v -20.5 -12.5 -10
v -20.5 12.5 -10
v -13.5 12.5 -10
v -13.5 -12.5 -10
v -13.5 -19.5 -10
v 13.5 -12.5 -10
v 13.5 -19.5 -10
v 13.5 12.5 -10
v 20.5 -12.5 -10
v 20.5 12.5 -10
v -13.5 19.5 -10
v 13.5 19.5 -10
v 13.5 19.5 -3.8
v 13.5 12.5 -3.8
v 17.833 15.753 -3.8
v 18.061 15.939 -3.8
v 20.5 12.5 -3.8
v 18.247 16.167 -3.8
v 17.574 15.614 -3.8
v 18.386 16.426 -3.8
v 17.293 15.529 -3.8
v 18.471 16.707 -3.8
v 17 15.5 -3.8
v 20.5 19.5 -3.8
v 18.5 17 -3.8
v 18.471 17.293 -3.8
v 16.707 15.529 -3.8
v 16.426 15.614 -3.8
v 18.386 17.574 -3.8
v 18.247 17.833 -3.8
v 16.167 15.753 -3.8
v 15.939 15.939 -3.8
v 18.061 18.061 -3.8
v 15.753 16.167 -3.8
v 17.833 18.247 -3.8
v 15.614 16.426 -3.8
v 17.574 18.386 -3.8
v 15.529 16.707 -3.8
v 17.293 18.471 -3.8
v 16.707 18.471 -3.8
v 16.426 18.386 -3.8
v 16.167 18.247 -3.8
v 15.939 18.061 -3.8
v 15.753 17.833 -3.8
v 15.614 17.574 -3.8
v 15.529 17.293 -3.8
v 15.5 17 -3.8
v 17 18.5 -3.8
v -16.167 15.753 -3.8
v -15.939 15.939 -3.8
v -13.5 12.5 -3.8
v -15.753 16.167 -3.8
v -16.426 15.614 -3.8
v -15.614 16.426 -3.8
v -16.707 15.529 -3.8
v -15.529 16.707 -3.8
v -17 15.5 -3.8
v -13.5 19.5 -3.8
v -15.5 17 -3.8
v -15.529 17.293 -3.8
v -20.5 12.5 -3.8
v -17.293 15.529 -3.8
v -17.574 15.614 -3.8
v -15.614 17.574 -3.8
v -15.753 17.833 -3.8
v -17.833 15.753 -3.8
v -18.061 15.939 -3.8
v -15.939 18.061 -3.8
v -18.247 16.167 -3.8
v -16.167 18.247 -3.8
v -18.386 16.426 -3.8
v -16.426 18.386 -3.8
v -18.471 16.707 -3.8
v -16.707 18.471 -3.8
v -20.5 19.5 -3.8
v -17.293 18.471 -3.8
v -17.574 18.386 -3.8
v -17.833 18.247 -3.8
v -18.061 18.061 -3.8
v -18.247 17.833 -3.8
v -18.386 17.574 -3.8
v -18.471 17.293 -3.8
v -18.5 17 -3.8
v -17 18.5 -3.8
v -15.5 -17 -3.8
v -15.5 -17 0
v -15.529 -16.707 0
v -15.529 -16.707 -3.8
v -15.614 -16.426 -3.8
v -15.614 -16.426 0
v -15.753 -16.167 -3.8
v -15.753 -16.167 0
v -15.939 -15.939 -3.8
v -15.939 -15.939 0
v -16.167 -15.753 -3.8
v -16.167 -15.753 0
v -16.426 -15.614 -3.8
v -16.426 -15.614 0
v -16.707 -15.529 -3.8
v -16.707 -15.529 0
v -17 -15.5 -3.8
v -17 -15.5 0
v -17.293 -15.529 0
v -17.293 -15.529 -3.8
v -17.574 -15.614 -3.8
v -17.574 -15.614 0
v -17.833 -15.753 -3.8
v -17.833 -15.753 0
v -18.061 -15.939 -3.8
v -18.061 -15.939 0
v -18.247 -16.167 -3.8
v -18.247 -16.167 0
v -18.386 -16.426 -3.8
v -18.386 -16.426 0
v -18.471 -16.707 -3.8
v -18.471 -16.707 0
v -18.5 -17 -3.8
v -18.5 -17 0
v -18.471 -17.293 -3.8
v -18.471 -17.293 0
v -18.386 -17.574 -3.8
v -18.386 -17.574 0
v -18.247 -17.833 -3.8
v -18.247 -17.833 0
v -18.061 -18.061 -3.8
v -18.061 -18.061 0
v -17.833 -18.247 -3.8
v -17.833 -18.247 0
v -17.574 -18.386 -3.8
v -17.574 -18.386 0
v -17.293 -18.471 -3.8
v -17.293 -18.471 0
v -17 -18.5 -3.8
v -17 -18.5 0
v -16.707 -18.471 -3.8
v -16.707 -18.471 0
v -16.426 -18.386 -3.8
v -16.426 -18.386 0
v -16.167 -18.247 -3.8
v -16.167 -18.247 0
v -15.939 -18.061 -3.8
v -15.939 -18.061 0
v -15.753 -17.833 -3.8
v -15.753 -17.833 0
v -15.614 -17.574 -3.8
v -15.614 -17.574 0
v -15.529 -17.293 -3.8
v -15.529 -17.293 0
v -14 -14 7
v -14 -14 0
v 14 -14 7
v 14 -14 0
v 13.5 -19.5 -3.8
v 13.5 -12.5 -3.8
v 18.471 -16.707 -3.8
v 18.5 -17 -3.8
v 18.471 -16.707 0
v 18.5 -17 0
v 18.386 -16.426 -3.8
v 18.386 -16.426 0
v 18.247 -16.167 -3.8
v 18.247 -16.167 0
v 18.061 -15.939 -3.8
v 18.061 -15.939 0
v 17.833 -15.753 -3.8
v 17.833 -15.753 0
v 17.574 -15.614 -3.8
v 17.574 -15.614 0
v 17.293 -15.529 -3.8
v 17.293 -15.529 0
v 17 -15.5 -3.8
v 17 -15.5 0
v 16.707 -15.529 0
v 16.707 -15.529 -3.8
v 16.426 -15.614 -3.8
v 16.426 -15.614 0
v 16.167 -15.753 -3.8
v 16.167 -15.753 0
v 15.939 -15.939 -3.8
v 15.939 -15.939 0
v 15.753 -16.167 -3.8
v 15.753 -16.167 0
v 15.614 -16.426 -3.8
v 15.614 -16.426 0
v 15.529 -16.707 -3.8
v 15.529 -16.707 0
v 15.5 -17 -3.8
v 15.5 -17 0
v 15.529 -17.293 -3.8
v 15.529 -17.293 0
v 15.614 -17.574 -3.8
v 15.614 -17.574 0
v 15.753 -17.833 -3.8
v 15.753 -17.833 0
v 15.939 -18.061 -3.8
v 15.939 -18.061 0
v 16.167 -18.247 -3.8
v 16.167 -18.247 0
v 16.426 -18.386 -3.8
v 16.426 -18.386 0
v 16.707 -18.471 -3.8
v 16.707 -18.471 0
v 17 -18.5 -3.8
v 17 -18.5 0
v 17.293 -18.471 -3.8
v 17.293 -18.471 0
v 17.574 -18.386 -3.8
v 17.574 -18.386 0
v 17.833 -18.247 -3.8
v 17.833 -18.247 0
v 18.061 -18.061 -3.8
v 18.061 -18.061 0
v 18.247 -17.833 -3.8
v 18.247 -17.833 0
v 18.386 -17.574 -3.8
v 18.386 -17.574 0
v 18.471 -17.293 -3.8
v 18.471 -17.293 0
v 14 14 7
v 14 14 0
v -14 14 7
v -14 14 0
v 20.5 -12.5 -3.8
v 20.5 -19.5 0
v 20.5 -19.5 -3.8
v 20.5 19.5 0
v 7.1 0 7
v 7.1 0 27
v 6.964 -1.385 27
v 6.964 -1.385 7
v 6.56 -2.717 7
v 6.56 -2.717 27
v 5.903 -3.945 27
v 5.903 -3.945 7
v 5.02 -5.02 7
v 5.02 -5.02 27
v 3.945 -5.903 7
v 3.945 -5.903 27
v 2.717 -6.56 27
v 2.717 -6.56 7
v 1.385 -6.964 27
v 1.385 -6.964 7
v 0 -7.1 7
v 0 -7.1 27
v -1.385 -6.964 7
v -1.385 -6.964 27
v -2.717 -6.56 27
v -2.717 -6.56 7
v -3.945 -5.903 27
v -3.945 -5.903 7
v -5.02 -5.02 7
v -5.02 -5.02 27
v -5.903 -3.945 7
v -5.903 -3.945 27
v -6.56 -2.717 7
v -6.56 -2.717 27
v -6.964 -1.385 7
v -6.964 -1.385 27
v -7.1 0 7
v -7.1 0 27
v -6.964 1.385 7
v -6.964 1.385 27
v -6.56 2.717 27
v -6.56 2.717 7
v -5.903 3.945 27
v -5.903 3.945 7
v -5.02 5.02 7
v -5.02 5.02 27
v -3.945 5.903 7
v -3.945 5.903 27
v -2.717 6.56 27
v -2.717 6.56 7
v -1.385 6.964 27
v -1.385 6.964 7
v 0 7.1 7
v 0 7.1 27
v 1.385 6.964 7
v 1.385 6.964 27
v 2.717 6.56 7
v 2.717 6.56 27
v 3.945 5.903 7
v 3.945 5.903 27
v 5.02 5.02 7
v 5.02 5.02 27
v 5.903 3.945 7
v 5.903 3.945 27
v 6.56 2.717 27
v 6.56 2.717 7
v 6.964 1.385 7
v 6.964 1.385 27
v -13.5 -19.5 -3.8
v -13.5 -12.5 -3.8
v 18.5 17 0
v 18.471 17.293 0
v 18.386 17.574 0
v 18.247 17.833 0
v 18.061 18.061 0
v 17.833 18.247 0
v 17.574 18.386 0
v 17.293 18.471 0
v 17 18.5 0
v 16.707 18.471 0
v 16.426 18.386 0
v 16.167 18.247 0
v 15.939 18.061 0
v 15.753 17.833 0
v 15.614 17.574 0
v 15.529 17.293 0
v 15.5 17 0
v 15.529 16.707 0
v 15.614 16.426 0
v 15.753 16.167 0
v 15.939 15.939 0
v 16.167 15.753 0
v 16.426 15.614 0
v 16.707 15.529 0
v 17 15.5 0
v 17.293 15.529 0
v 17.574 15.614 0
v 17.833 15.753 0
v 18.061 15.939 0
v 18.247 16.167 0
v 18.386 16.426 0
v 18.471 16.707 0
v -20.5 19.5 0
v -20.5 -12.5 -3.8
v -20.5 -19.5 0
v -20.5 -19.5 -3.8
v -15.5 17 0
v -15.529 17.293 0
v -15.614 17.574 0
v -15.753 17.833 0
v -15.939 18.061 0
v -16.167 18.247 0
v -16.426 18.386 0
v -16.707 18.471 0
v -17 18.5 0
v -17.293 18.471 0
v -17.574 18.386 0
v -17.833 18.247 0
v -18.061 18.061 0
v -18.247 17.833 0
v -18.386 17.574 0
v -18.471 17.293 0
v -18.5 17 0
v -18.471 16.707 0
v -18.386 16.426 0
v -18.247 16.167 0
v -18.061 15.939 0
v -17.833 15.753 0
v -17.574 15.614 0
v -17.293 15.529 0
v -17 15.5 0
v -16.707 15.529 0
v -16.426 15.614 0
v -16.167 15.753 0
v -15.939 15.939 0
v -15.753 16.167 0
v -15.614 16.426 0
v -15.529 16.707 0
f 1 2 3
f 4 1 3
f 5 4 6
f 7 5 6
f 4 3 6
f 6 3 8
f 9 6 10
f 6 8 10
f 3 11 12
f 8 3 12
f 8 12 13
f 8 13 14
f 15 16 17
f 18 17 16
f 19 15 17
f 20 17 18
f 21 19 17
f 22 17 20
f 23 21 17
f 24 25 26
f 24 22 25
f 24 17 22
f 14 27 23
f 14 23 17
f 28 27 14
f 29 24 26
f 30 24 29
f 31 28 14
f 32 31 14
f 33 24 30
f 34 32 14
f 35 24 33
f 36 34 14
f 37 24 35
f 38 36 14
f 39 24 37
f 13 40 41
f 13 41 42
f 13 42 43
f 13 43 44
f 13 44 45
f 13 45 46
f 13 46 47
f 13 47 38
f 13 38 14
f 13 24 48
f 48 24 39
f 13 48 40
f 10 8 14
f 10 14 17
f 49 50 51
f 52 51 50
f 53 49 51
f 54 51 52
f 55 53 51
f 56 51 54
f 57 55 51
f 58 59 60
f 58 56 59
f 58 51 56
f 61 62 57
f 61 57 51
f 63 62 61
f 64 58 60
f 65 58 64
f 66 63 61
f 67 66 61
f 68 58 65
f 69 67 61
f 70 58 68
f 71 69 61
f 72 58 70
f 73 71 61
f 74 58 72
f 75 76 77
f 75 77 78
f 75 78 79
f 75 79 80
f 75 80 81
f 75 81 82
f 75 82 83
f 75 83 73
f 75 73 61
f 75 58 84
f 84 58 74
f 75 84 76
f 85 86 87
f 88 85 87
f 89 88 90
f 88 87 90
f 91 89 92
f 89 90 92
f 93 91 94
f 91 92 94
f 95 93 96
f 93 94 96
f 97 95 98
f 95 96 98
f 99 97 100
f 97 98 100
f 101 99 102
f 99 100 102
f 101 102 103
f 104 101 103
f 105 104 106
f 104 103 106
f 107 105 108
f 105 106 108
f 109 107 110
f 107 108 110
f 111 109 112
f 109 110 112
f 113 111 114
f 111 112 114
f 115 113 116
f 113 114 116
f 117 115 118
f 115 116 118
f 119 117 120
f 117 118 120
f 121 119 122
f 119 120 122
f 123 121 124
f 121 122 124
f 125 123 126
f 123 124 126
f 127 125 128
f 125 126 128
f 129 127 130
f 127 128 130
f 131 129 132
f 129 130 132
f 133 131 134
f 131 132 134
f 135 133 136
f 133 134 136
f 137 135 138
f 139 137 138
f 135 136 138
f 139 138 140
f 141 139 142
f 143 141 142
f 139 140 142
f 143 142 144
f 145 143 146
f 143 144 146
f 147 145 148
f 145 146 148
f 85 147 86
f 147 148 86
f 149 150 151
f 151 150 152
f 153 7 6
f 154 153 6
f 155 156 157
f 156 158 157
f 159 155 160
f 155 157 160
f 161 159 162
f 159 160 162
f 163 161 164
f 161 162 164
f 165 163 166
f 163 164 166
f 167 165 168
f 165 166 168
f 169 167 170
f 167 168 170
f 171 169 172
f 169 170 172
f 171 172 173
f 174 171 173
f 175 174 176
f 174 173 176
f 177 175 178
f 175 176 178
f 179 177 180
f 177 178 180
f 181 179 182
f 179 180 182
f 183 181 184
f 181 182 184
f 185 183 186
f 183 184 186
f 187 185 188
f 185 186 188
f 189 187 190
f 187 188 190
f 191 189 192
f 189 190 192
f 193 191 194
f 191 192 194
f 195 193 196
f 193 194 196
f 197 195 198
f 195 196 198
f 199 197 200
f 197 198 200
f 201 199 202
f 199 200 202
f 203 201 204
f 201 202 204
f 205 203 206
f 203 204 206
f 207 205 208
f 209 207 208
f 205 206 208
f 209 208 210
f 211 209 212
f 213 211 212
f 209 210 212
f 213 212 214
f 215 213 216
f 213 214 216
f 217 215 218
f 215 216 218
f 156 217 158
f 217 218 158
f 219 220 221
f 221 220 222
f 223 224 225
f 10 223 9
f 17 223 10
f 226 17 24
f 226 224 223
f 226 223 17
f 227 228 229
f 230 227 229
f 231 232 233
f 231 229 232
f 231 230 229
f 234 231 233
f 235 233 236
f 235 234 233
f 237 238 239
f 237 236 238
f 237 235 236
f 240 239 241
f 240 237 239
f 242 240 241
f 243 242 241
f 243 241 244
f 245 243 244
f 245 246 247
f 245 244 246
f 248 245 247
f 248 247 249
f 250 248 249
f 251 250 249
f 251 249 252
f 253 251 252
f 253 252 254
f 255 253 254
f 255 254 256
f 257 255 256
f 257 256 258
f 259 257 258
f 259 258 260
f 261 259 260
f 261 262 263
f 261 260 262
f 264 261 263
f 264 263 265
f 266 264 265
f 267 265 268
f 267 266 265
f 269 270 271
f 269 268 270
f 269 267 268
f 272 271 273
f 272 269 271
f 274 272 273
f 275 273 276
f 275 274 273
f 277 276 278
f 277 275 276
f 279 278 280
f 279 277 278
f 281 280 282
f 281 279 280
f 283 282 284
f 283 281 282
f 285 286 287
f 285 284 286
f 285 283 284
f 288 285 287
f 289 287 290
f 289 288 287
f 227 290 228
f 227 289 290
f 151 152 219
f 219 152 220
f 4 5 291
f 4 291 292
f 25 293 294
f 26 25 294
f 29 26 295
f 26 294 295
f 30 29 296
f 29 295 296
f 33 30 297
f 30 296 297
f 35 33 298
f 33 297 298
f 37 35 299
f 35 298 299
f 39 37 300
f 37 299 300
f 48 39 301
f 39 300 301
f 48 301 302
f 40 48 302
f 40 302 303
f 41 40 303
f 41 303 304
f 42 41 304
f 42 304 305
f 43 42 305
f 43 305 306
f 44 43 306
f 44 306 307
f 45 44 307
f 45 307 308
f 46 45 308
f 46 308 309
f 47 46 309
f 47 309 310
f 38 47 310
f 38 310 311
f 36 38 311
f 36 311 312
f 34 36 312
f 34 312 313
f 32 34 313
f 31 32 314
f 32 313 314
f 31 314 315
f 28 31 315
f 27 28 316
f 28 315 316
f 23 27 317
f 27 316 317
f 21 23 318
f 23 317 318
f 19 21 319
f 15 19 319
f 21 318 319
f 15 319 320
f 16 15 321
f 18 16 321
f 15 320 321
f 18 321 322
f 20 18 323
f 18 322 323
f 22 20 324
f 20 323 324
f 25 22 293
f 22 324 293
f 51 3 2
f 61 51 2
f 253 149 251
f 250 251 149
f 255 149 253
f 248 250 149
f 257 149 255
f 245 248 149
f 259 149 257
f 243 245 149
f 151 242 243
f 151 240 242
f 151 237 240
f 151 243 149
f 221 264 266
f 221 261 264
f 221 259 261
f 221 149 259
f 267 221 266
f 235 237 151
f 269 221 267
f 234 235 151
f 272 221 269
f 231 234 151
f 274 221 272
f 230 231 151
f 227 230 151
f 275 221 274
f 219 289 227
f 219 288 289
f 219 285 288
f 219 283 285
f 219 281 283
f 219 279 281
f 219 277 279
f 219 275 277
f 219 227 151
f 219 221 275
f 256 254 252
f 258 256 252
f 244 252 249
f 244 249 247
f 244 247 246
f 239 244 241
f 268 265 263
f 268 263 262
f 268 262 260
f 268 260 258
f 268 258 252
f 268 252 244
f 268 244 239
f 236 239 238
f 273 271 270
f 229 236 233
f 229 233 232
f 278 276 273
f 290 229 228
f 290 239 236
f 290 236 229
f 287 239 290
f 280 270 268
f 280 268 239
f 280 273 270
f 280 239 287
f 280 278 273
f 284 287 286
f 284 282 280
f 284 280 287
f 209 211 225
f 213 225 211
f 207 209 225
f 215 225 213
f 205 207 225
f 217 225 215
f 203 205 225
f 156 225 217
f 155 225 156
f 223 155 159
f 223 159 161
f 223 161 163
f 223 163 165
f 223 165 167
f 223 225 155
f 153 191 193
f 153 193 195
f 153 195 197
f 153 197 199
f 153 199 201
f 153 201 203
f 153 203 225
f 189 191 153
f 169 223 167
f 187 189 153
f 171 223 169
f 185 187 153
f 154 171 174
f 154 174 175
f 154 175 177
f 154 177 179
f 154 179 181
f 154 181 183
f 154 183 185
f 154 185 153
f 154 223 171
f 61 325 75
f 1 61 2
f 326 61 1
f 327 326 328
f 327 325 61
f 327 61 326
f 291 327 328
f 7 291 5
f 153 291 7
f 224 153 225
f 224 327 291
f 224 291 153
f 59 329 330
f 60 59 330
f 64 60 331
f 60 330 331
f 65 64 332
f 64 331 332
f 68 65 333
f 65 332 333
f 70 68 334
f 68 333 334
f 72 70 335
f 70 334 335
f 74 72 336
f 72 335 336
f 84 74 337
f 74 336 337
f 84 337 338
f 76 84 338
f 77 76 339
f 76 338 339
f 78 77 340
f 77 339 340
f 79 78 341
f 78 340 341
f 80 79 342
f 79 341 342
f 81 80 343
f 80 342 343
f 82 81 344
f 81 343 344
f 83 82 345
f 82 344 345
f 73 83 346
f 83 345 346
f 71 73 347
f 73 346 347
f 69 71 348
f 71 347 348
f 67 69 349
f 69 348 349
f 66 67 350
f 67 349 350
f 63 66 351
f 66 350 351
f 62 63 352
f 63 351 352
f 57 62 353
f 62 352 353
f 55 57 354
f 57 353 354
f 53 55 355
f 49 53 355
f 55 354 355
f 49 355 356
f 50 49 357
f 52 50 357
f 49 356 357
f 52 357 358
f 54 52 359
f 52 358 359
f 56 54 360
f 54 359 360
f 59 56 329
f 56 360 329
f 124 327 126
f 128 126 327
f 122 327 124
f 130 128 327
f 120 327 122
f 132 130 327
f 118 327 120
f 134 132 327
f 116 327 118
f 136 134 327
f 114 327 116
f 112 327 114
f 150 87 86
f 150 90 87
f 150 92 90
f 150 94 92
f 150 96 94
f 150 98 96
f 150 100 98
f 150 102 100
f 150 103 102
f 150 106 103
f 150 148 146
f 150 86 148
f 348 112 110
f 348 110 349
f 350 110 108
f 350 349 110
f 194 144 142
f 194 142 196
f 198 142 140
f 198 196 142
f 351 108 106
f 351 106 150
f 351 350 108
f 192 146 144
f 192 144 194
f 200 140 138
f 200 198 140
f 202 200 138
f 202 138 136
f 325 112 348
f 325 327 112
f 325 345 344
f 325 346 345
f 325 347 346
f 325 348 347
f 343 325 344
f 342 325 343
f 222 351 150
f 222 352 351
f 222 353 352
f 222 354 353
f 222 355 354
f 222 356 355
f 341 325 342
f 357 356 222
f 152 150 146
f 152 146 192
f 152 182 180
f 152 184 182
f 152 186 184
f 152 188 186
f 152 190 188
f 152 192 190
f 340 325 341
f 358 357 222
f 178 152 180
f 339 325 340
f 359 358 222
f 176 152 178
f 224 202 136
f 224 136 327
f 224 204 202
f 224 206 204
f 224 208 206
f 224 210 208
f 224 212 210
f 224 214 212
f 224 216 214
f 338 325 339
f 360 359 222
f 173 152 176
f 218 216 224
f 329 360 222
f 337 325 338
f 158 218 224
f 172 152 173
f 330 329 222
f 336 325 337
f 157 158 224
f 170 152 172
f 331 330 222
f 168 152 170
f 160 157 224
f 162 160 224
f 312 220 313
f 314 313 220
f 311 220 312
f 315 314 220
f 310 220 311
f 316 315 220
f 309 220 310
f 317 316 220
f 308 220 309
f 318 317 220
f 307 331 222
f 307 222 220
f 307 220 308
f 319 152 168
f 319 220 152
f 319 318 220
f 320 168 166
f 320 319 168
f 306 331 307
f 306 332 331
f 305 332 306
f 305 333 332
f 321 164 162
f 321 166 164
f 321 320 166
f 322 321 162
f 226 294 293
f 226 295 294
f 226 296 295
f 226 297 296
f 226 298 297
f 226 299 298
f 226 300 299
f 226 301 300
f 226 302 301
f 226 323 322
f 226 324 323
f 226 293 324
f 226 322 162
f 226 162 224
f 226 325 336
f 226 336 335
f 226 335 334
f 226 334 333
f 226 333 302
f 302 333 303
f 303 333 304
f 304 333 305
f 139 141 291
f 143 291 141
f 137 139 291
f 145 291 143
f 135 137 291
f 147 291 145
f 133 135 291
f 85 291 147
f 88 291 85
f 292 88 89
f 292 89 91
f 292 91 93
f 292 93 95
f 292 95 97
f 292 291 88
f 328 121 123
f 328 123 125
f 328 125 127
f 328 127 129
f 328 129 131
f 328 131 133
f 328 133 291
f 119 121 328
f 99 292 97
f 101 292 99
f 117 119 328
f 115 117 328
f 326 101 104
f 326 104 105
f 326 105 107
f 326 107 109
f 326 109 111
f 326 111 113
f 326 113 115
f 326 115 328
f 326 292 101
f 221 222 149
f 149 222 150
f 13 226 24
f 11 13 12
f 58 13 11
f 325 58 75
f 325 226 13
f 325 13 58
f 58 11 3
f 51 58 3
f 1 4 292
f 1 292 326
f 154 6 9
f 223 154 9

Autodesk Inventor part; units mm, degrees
ref_plane "YZ Plane" through (0, 0, 0) normal (1, 0, 0) x (0, 1, 0)
ref_plane "XZ Plane" through (0, 0, 0) normal (0, 1, 0) x (-1, 0, 0)
ref_plane "XY Plane" through (0, 0, 0) normal (0, 0, 1) x (1, 0, 0)
sketch "Sketch1" plane through (0, 0, 0) normal (0, 0, 1) x (1, 0, 0)
  line L0 (-20.5, -19.5) -> (20.5, -19.5)
  line L1 (20.5, -19.5) -> (20.5, 19.5)
  line L2 (20.5, 19.5) -> (-20.5, 19.5)
  line L3 (-20.5, 19.5) -> (-20.5, -19.5)
  line L4 (-20.5, -19.5) -> (20.5, 19.5) construction
  line L5 (20.5, -19.5) -> (-20.5, 19.5) construction
  line L6 (-17, -17) -> (17, -17) construction
  line L7 (17, -17) -> (17, 17) construction
  line L8 (17, 17) -> (-17, 17) construction
  line L9 (-17, 17) -> (-17, -17) construction
  line L10 (-17, -17) -> (17, 17) construction
  line L11 (17, -17) -> (-17, 17) construction
  circle A0 centre (-17, 17) radius 1.5
  circle A1 centre (17, 17) radius 1.5
  circle A2 centre (17, -17) radius 1.5
  circle A3 centre (-17, -17) radius 1.5
  point P0 (0, 0)
  dimension "d0" = 41
  dimension "d1" = 39
  dimension "d2" = 34
  dimension "d3" = 34
  dimension "d4" = 3
extrude "Extrusion1" add sketch "Sketch1" against normal blind 10
sketch "Sketch2" plane through (0, 0, 0) normal (0, 0, 1) x (1, 0, 0)
  line L0 (-14, -14) -> (14, -14)
  line L1 (14, -14) -> (14, 14)
  line L2 (14, 14) -> (-14, 14)
  line L3 (-14, 14) -> (-14, -14)
  line L4 (-14, -14) -> (14, 14) construction
  line L5 (14, -14) -> (-14, 14) construction
  point P0 (0, 0)
  dimension "d7" = 28
  dimension "d8" = 28
extrude "Extrusion2" add sketch "Sketch2" along normal blind 7
sketch "Sketch3" plane through (0, 0, 7) normal (0, 0, 1) x (1, 0, 0)
  circle A0 centre (0, 0) radius 7.1
  dimension "d11" = 14.2
extrude "Extrusion3" add sketch "Sketch3" along normal blind 20
sketch "Sketch4" plane through (0, 0, -10) normal (0, 0, -1) x (-1, 0, 0)
  line L0 (-20.5, 19.5) -> (-20.5, -19.5) projected
  line L1 (-20.5, 19.5) -> (-13.5, 19.5)
  line L2 (-13.5, 19.5) -> (-13.5, 12.5)
  line L3 (-13.5, 12.5) -> (-20.5, 12.5)
  line L4 (-20.5, 12.5) -> (-20.5, 19.5)
  line L5 (20.5, 19.5) -> (-20.5, 19.5) projected
  line L6 (20.5, 19.5) -> (13.5, 19.5)
  line L7 (13.5, 19.5) -> (13.5, 12.5)
  line L8 (13.5, 12.5) -> (20.5, 12.5)
  line L9 (20.5, 12.5) -> (20.5, 19.5)
  line L10 (20.5, 19.5) -> (20.5, -19.5) projected
  line L11 (20.5, -19.5) -> (13.5, -19.5)
  line L12 (13.5, -19.5) -> (13.5, -12.5)
  line L13 (13.5, -12.5) -> (20.5, -12.5)
  line L14 (20.5, -12.5) -> (20.5, -19.5)
  line L15 (-20.5, -19.5) -> (-13.5, -19.5)
  line L16 (-13.5, -19.5) -> (-13.5, -12.5)
  line L17 (-13.5, -12.5) -> (-20.5, -12.5)
  line L18 (-20.5, -12.5) -> (-20.5, -19.5)
  point P0 (0, 0)
  dimension "d14" = 7
extrude "Extrusion4" cut sketch "Sketch4" against normal blind 6.2
equation "\"d0\" = imx291ModuleWidth"
equation "\"d1\" = imx291ModuleLength"
equation "\"d2\" = imx291ModuleScrewWidthDistance"
equation "\"d3\" = imx291ModuleScrewLengthDistance"
equation "\"d4\" = screwDiameterHole"
equation "\"d5\" = imx291ModuleDepth"
equation "\"d7\" = lensBaseWidth"
equation "\"d8\" = lensBaseLength"
equation "\"d9\" = lensBaseDepth"
equation "\"d11\" = lensDiameter"
equation "\"d12\" = lensDepth"
equation "\"imx291ModuleWidth\" = 41"
equation "\"imx291ModuleLength\" = 39"
equation "\"imx291ModuleDepth\" = 10"
equation "\"imx291ModuleScrewWidthDistance\" = 34"
equation "\"imx291ModuleScrewLengthDistance\" = 34"
equation "\"screwDiameterHole\" = 3"
equation "\"lensBaseWidth\" = 28"
equation "\"lensBaseLength\" = 28"
equation "\"lensBaseDepth\" = 7"
equation "\"lensDiameter\" = 14.2"
equation "\"lensDepth\" = 20"
properties part number "imx291CameraModule"
